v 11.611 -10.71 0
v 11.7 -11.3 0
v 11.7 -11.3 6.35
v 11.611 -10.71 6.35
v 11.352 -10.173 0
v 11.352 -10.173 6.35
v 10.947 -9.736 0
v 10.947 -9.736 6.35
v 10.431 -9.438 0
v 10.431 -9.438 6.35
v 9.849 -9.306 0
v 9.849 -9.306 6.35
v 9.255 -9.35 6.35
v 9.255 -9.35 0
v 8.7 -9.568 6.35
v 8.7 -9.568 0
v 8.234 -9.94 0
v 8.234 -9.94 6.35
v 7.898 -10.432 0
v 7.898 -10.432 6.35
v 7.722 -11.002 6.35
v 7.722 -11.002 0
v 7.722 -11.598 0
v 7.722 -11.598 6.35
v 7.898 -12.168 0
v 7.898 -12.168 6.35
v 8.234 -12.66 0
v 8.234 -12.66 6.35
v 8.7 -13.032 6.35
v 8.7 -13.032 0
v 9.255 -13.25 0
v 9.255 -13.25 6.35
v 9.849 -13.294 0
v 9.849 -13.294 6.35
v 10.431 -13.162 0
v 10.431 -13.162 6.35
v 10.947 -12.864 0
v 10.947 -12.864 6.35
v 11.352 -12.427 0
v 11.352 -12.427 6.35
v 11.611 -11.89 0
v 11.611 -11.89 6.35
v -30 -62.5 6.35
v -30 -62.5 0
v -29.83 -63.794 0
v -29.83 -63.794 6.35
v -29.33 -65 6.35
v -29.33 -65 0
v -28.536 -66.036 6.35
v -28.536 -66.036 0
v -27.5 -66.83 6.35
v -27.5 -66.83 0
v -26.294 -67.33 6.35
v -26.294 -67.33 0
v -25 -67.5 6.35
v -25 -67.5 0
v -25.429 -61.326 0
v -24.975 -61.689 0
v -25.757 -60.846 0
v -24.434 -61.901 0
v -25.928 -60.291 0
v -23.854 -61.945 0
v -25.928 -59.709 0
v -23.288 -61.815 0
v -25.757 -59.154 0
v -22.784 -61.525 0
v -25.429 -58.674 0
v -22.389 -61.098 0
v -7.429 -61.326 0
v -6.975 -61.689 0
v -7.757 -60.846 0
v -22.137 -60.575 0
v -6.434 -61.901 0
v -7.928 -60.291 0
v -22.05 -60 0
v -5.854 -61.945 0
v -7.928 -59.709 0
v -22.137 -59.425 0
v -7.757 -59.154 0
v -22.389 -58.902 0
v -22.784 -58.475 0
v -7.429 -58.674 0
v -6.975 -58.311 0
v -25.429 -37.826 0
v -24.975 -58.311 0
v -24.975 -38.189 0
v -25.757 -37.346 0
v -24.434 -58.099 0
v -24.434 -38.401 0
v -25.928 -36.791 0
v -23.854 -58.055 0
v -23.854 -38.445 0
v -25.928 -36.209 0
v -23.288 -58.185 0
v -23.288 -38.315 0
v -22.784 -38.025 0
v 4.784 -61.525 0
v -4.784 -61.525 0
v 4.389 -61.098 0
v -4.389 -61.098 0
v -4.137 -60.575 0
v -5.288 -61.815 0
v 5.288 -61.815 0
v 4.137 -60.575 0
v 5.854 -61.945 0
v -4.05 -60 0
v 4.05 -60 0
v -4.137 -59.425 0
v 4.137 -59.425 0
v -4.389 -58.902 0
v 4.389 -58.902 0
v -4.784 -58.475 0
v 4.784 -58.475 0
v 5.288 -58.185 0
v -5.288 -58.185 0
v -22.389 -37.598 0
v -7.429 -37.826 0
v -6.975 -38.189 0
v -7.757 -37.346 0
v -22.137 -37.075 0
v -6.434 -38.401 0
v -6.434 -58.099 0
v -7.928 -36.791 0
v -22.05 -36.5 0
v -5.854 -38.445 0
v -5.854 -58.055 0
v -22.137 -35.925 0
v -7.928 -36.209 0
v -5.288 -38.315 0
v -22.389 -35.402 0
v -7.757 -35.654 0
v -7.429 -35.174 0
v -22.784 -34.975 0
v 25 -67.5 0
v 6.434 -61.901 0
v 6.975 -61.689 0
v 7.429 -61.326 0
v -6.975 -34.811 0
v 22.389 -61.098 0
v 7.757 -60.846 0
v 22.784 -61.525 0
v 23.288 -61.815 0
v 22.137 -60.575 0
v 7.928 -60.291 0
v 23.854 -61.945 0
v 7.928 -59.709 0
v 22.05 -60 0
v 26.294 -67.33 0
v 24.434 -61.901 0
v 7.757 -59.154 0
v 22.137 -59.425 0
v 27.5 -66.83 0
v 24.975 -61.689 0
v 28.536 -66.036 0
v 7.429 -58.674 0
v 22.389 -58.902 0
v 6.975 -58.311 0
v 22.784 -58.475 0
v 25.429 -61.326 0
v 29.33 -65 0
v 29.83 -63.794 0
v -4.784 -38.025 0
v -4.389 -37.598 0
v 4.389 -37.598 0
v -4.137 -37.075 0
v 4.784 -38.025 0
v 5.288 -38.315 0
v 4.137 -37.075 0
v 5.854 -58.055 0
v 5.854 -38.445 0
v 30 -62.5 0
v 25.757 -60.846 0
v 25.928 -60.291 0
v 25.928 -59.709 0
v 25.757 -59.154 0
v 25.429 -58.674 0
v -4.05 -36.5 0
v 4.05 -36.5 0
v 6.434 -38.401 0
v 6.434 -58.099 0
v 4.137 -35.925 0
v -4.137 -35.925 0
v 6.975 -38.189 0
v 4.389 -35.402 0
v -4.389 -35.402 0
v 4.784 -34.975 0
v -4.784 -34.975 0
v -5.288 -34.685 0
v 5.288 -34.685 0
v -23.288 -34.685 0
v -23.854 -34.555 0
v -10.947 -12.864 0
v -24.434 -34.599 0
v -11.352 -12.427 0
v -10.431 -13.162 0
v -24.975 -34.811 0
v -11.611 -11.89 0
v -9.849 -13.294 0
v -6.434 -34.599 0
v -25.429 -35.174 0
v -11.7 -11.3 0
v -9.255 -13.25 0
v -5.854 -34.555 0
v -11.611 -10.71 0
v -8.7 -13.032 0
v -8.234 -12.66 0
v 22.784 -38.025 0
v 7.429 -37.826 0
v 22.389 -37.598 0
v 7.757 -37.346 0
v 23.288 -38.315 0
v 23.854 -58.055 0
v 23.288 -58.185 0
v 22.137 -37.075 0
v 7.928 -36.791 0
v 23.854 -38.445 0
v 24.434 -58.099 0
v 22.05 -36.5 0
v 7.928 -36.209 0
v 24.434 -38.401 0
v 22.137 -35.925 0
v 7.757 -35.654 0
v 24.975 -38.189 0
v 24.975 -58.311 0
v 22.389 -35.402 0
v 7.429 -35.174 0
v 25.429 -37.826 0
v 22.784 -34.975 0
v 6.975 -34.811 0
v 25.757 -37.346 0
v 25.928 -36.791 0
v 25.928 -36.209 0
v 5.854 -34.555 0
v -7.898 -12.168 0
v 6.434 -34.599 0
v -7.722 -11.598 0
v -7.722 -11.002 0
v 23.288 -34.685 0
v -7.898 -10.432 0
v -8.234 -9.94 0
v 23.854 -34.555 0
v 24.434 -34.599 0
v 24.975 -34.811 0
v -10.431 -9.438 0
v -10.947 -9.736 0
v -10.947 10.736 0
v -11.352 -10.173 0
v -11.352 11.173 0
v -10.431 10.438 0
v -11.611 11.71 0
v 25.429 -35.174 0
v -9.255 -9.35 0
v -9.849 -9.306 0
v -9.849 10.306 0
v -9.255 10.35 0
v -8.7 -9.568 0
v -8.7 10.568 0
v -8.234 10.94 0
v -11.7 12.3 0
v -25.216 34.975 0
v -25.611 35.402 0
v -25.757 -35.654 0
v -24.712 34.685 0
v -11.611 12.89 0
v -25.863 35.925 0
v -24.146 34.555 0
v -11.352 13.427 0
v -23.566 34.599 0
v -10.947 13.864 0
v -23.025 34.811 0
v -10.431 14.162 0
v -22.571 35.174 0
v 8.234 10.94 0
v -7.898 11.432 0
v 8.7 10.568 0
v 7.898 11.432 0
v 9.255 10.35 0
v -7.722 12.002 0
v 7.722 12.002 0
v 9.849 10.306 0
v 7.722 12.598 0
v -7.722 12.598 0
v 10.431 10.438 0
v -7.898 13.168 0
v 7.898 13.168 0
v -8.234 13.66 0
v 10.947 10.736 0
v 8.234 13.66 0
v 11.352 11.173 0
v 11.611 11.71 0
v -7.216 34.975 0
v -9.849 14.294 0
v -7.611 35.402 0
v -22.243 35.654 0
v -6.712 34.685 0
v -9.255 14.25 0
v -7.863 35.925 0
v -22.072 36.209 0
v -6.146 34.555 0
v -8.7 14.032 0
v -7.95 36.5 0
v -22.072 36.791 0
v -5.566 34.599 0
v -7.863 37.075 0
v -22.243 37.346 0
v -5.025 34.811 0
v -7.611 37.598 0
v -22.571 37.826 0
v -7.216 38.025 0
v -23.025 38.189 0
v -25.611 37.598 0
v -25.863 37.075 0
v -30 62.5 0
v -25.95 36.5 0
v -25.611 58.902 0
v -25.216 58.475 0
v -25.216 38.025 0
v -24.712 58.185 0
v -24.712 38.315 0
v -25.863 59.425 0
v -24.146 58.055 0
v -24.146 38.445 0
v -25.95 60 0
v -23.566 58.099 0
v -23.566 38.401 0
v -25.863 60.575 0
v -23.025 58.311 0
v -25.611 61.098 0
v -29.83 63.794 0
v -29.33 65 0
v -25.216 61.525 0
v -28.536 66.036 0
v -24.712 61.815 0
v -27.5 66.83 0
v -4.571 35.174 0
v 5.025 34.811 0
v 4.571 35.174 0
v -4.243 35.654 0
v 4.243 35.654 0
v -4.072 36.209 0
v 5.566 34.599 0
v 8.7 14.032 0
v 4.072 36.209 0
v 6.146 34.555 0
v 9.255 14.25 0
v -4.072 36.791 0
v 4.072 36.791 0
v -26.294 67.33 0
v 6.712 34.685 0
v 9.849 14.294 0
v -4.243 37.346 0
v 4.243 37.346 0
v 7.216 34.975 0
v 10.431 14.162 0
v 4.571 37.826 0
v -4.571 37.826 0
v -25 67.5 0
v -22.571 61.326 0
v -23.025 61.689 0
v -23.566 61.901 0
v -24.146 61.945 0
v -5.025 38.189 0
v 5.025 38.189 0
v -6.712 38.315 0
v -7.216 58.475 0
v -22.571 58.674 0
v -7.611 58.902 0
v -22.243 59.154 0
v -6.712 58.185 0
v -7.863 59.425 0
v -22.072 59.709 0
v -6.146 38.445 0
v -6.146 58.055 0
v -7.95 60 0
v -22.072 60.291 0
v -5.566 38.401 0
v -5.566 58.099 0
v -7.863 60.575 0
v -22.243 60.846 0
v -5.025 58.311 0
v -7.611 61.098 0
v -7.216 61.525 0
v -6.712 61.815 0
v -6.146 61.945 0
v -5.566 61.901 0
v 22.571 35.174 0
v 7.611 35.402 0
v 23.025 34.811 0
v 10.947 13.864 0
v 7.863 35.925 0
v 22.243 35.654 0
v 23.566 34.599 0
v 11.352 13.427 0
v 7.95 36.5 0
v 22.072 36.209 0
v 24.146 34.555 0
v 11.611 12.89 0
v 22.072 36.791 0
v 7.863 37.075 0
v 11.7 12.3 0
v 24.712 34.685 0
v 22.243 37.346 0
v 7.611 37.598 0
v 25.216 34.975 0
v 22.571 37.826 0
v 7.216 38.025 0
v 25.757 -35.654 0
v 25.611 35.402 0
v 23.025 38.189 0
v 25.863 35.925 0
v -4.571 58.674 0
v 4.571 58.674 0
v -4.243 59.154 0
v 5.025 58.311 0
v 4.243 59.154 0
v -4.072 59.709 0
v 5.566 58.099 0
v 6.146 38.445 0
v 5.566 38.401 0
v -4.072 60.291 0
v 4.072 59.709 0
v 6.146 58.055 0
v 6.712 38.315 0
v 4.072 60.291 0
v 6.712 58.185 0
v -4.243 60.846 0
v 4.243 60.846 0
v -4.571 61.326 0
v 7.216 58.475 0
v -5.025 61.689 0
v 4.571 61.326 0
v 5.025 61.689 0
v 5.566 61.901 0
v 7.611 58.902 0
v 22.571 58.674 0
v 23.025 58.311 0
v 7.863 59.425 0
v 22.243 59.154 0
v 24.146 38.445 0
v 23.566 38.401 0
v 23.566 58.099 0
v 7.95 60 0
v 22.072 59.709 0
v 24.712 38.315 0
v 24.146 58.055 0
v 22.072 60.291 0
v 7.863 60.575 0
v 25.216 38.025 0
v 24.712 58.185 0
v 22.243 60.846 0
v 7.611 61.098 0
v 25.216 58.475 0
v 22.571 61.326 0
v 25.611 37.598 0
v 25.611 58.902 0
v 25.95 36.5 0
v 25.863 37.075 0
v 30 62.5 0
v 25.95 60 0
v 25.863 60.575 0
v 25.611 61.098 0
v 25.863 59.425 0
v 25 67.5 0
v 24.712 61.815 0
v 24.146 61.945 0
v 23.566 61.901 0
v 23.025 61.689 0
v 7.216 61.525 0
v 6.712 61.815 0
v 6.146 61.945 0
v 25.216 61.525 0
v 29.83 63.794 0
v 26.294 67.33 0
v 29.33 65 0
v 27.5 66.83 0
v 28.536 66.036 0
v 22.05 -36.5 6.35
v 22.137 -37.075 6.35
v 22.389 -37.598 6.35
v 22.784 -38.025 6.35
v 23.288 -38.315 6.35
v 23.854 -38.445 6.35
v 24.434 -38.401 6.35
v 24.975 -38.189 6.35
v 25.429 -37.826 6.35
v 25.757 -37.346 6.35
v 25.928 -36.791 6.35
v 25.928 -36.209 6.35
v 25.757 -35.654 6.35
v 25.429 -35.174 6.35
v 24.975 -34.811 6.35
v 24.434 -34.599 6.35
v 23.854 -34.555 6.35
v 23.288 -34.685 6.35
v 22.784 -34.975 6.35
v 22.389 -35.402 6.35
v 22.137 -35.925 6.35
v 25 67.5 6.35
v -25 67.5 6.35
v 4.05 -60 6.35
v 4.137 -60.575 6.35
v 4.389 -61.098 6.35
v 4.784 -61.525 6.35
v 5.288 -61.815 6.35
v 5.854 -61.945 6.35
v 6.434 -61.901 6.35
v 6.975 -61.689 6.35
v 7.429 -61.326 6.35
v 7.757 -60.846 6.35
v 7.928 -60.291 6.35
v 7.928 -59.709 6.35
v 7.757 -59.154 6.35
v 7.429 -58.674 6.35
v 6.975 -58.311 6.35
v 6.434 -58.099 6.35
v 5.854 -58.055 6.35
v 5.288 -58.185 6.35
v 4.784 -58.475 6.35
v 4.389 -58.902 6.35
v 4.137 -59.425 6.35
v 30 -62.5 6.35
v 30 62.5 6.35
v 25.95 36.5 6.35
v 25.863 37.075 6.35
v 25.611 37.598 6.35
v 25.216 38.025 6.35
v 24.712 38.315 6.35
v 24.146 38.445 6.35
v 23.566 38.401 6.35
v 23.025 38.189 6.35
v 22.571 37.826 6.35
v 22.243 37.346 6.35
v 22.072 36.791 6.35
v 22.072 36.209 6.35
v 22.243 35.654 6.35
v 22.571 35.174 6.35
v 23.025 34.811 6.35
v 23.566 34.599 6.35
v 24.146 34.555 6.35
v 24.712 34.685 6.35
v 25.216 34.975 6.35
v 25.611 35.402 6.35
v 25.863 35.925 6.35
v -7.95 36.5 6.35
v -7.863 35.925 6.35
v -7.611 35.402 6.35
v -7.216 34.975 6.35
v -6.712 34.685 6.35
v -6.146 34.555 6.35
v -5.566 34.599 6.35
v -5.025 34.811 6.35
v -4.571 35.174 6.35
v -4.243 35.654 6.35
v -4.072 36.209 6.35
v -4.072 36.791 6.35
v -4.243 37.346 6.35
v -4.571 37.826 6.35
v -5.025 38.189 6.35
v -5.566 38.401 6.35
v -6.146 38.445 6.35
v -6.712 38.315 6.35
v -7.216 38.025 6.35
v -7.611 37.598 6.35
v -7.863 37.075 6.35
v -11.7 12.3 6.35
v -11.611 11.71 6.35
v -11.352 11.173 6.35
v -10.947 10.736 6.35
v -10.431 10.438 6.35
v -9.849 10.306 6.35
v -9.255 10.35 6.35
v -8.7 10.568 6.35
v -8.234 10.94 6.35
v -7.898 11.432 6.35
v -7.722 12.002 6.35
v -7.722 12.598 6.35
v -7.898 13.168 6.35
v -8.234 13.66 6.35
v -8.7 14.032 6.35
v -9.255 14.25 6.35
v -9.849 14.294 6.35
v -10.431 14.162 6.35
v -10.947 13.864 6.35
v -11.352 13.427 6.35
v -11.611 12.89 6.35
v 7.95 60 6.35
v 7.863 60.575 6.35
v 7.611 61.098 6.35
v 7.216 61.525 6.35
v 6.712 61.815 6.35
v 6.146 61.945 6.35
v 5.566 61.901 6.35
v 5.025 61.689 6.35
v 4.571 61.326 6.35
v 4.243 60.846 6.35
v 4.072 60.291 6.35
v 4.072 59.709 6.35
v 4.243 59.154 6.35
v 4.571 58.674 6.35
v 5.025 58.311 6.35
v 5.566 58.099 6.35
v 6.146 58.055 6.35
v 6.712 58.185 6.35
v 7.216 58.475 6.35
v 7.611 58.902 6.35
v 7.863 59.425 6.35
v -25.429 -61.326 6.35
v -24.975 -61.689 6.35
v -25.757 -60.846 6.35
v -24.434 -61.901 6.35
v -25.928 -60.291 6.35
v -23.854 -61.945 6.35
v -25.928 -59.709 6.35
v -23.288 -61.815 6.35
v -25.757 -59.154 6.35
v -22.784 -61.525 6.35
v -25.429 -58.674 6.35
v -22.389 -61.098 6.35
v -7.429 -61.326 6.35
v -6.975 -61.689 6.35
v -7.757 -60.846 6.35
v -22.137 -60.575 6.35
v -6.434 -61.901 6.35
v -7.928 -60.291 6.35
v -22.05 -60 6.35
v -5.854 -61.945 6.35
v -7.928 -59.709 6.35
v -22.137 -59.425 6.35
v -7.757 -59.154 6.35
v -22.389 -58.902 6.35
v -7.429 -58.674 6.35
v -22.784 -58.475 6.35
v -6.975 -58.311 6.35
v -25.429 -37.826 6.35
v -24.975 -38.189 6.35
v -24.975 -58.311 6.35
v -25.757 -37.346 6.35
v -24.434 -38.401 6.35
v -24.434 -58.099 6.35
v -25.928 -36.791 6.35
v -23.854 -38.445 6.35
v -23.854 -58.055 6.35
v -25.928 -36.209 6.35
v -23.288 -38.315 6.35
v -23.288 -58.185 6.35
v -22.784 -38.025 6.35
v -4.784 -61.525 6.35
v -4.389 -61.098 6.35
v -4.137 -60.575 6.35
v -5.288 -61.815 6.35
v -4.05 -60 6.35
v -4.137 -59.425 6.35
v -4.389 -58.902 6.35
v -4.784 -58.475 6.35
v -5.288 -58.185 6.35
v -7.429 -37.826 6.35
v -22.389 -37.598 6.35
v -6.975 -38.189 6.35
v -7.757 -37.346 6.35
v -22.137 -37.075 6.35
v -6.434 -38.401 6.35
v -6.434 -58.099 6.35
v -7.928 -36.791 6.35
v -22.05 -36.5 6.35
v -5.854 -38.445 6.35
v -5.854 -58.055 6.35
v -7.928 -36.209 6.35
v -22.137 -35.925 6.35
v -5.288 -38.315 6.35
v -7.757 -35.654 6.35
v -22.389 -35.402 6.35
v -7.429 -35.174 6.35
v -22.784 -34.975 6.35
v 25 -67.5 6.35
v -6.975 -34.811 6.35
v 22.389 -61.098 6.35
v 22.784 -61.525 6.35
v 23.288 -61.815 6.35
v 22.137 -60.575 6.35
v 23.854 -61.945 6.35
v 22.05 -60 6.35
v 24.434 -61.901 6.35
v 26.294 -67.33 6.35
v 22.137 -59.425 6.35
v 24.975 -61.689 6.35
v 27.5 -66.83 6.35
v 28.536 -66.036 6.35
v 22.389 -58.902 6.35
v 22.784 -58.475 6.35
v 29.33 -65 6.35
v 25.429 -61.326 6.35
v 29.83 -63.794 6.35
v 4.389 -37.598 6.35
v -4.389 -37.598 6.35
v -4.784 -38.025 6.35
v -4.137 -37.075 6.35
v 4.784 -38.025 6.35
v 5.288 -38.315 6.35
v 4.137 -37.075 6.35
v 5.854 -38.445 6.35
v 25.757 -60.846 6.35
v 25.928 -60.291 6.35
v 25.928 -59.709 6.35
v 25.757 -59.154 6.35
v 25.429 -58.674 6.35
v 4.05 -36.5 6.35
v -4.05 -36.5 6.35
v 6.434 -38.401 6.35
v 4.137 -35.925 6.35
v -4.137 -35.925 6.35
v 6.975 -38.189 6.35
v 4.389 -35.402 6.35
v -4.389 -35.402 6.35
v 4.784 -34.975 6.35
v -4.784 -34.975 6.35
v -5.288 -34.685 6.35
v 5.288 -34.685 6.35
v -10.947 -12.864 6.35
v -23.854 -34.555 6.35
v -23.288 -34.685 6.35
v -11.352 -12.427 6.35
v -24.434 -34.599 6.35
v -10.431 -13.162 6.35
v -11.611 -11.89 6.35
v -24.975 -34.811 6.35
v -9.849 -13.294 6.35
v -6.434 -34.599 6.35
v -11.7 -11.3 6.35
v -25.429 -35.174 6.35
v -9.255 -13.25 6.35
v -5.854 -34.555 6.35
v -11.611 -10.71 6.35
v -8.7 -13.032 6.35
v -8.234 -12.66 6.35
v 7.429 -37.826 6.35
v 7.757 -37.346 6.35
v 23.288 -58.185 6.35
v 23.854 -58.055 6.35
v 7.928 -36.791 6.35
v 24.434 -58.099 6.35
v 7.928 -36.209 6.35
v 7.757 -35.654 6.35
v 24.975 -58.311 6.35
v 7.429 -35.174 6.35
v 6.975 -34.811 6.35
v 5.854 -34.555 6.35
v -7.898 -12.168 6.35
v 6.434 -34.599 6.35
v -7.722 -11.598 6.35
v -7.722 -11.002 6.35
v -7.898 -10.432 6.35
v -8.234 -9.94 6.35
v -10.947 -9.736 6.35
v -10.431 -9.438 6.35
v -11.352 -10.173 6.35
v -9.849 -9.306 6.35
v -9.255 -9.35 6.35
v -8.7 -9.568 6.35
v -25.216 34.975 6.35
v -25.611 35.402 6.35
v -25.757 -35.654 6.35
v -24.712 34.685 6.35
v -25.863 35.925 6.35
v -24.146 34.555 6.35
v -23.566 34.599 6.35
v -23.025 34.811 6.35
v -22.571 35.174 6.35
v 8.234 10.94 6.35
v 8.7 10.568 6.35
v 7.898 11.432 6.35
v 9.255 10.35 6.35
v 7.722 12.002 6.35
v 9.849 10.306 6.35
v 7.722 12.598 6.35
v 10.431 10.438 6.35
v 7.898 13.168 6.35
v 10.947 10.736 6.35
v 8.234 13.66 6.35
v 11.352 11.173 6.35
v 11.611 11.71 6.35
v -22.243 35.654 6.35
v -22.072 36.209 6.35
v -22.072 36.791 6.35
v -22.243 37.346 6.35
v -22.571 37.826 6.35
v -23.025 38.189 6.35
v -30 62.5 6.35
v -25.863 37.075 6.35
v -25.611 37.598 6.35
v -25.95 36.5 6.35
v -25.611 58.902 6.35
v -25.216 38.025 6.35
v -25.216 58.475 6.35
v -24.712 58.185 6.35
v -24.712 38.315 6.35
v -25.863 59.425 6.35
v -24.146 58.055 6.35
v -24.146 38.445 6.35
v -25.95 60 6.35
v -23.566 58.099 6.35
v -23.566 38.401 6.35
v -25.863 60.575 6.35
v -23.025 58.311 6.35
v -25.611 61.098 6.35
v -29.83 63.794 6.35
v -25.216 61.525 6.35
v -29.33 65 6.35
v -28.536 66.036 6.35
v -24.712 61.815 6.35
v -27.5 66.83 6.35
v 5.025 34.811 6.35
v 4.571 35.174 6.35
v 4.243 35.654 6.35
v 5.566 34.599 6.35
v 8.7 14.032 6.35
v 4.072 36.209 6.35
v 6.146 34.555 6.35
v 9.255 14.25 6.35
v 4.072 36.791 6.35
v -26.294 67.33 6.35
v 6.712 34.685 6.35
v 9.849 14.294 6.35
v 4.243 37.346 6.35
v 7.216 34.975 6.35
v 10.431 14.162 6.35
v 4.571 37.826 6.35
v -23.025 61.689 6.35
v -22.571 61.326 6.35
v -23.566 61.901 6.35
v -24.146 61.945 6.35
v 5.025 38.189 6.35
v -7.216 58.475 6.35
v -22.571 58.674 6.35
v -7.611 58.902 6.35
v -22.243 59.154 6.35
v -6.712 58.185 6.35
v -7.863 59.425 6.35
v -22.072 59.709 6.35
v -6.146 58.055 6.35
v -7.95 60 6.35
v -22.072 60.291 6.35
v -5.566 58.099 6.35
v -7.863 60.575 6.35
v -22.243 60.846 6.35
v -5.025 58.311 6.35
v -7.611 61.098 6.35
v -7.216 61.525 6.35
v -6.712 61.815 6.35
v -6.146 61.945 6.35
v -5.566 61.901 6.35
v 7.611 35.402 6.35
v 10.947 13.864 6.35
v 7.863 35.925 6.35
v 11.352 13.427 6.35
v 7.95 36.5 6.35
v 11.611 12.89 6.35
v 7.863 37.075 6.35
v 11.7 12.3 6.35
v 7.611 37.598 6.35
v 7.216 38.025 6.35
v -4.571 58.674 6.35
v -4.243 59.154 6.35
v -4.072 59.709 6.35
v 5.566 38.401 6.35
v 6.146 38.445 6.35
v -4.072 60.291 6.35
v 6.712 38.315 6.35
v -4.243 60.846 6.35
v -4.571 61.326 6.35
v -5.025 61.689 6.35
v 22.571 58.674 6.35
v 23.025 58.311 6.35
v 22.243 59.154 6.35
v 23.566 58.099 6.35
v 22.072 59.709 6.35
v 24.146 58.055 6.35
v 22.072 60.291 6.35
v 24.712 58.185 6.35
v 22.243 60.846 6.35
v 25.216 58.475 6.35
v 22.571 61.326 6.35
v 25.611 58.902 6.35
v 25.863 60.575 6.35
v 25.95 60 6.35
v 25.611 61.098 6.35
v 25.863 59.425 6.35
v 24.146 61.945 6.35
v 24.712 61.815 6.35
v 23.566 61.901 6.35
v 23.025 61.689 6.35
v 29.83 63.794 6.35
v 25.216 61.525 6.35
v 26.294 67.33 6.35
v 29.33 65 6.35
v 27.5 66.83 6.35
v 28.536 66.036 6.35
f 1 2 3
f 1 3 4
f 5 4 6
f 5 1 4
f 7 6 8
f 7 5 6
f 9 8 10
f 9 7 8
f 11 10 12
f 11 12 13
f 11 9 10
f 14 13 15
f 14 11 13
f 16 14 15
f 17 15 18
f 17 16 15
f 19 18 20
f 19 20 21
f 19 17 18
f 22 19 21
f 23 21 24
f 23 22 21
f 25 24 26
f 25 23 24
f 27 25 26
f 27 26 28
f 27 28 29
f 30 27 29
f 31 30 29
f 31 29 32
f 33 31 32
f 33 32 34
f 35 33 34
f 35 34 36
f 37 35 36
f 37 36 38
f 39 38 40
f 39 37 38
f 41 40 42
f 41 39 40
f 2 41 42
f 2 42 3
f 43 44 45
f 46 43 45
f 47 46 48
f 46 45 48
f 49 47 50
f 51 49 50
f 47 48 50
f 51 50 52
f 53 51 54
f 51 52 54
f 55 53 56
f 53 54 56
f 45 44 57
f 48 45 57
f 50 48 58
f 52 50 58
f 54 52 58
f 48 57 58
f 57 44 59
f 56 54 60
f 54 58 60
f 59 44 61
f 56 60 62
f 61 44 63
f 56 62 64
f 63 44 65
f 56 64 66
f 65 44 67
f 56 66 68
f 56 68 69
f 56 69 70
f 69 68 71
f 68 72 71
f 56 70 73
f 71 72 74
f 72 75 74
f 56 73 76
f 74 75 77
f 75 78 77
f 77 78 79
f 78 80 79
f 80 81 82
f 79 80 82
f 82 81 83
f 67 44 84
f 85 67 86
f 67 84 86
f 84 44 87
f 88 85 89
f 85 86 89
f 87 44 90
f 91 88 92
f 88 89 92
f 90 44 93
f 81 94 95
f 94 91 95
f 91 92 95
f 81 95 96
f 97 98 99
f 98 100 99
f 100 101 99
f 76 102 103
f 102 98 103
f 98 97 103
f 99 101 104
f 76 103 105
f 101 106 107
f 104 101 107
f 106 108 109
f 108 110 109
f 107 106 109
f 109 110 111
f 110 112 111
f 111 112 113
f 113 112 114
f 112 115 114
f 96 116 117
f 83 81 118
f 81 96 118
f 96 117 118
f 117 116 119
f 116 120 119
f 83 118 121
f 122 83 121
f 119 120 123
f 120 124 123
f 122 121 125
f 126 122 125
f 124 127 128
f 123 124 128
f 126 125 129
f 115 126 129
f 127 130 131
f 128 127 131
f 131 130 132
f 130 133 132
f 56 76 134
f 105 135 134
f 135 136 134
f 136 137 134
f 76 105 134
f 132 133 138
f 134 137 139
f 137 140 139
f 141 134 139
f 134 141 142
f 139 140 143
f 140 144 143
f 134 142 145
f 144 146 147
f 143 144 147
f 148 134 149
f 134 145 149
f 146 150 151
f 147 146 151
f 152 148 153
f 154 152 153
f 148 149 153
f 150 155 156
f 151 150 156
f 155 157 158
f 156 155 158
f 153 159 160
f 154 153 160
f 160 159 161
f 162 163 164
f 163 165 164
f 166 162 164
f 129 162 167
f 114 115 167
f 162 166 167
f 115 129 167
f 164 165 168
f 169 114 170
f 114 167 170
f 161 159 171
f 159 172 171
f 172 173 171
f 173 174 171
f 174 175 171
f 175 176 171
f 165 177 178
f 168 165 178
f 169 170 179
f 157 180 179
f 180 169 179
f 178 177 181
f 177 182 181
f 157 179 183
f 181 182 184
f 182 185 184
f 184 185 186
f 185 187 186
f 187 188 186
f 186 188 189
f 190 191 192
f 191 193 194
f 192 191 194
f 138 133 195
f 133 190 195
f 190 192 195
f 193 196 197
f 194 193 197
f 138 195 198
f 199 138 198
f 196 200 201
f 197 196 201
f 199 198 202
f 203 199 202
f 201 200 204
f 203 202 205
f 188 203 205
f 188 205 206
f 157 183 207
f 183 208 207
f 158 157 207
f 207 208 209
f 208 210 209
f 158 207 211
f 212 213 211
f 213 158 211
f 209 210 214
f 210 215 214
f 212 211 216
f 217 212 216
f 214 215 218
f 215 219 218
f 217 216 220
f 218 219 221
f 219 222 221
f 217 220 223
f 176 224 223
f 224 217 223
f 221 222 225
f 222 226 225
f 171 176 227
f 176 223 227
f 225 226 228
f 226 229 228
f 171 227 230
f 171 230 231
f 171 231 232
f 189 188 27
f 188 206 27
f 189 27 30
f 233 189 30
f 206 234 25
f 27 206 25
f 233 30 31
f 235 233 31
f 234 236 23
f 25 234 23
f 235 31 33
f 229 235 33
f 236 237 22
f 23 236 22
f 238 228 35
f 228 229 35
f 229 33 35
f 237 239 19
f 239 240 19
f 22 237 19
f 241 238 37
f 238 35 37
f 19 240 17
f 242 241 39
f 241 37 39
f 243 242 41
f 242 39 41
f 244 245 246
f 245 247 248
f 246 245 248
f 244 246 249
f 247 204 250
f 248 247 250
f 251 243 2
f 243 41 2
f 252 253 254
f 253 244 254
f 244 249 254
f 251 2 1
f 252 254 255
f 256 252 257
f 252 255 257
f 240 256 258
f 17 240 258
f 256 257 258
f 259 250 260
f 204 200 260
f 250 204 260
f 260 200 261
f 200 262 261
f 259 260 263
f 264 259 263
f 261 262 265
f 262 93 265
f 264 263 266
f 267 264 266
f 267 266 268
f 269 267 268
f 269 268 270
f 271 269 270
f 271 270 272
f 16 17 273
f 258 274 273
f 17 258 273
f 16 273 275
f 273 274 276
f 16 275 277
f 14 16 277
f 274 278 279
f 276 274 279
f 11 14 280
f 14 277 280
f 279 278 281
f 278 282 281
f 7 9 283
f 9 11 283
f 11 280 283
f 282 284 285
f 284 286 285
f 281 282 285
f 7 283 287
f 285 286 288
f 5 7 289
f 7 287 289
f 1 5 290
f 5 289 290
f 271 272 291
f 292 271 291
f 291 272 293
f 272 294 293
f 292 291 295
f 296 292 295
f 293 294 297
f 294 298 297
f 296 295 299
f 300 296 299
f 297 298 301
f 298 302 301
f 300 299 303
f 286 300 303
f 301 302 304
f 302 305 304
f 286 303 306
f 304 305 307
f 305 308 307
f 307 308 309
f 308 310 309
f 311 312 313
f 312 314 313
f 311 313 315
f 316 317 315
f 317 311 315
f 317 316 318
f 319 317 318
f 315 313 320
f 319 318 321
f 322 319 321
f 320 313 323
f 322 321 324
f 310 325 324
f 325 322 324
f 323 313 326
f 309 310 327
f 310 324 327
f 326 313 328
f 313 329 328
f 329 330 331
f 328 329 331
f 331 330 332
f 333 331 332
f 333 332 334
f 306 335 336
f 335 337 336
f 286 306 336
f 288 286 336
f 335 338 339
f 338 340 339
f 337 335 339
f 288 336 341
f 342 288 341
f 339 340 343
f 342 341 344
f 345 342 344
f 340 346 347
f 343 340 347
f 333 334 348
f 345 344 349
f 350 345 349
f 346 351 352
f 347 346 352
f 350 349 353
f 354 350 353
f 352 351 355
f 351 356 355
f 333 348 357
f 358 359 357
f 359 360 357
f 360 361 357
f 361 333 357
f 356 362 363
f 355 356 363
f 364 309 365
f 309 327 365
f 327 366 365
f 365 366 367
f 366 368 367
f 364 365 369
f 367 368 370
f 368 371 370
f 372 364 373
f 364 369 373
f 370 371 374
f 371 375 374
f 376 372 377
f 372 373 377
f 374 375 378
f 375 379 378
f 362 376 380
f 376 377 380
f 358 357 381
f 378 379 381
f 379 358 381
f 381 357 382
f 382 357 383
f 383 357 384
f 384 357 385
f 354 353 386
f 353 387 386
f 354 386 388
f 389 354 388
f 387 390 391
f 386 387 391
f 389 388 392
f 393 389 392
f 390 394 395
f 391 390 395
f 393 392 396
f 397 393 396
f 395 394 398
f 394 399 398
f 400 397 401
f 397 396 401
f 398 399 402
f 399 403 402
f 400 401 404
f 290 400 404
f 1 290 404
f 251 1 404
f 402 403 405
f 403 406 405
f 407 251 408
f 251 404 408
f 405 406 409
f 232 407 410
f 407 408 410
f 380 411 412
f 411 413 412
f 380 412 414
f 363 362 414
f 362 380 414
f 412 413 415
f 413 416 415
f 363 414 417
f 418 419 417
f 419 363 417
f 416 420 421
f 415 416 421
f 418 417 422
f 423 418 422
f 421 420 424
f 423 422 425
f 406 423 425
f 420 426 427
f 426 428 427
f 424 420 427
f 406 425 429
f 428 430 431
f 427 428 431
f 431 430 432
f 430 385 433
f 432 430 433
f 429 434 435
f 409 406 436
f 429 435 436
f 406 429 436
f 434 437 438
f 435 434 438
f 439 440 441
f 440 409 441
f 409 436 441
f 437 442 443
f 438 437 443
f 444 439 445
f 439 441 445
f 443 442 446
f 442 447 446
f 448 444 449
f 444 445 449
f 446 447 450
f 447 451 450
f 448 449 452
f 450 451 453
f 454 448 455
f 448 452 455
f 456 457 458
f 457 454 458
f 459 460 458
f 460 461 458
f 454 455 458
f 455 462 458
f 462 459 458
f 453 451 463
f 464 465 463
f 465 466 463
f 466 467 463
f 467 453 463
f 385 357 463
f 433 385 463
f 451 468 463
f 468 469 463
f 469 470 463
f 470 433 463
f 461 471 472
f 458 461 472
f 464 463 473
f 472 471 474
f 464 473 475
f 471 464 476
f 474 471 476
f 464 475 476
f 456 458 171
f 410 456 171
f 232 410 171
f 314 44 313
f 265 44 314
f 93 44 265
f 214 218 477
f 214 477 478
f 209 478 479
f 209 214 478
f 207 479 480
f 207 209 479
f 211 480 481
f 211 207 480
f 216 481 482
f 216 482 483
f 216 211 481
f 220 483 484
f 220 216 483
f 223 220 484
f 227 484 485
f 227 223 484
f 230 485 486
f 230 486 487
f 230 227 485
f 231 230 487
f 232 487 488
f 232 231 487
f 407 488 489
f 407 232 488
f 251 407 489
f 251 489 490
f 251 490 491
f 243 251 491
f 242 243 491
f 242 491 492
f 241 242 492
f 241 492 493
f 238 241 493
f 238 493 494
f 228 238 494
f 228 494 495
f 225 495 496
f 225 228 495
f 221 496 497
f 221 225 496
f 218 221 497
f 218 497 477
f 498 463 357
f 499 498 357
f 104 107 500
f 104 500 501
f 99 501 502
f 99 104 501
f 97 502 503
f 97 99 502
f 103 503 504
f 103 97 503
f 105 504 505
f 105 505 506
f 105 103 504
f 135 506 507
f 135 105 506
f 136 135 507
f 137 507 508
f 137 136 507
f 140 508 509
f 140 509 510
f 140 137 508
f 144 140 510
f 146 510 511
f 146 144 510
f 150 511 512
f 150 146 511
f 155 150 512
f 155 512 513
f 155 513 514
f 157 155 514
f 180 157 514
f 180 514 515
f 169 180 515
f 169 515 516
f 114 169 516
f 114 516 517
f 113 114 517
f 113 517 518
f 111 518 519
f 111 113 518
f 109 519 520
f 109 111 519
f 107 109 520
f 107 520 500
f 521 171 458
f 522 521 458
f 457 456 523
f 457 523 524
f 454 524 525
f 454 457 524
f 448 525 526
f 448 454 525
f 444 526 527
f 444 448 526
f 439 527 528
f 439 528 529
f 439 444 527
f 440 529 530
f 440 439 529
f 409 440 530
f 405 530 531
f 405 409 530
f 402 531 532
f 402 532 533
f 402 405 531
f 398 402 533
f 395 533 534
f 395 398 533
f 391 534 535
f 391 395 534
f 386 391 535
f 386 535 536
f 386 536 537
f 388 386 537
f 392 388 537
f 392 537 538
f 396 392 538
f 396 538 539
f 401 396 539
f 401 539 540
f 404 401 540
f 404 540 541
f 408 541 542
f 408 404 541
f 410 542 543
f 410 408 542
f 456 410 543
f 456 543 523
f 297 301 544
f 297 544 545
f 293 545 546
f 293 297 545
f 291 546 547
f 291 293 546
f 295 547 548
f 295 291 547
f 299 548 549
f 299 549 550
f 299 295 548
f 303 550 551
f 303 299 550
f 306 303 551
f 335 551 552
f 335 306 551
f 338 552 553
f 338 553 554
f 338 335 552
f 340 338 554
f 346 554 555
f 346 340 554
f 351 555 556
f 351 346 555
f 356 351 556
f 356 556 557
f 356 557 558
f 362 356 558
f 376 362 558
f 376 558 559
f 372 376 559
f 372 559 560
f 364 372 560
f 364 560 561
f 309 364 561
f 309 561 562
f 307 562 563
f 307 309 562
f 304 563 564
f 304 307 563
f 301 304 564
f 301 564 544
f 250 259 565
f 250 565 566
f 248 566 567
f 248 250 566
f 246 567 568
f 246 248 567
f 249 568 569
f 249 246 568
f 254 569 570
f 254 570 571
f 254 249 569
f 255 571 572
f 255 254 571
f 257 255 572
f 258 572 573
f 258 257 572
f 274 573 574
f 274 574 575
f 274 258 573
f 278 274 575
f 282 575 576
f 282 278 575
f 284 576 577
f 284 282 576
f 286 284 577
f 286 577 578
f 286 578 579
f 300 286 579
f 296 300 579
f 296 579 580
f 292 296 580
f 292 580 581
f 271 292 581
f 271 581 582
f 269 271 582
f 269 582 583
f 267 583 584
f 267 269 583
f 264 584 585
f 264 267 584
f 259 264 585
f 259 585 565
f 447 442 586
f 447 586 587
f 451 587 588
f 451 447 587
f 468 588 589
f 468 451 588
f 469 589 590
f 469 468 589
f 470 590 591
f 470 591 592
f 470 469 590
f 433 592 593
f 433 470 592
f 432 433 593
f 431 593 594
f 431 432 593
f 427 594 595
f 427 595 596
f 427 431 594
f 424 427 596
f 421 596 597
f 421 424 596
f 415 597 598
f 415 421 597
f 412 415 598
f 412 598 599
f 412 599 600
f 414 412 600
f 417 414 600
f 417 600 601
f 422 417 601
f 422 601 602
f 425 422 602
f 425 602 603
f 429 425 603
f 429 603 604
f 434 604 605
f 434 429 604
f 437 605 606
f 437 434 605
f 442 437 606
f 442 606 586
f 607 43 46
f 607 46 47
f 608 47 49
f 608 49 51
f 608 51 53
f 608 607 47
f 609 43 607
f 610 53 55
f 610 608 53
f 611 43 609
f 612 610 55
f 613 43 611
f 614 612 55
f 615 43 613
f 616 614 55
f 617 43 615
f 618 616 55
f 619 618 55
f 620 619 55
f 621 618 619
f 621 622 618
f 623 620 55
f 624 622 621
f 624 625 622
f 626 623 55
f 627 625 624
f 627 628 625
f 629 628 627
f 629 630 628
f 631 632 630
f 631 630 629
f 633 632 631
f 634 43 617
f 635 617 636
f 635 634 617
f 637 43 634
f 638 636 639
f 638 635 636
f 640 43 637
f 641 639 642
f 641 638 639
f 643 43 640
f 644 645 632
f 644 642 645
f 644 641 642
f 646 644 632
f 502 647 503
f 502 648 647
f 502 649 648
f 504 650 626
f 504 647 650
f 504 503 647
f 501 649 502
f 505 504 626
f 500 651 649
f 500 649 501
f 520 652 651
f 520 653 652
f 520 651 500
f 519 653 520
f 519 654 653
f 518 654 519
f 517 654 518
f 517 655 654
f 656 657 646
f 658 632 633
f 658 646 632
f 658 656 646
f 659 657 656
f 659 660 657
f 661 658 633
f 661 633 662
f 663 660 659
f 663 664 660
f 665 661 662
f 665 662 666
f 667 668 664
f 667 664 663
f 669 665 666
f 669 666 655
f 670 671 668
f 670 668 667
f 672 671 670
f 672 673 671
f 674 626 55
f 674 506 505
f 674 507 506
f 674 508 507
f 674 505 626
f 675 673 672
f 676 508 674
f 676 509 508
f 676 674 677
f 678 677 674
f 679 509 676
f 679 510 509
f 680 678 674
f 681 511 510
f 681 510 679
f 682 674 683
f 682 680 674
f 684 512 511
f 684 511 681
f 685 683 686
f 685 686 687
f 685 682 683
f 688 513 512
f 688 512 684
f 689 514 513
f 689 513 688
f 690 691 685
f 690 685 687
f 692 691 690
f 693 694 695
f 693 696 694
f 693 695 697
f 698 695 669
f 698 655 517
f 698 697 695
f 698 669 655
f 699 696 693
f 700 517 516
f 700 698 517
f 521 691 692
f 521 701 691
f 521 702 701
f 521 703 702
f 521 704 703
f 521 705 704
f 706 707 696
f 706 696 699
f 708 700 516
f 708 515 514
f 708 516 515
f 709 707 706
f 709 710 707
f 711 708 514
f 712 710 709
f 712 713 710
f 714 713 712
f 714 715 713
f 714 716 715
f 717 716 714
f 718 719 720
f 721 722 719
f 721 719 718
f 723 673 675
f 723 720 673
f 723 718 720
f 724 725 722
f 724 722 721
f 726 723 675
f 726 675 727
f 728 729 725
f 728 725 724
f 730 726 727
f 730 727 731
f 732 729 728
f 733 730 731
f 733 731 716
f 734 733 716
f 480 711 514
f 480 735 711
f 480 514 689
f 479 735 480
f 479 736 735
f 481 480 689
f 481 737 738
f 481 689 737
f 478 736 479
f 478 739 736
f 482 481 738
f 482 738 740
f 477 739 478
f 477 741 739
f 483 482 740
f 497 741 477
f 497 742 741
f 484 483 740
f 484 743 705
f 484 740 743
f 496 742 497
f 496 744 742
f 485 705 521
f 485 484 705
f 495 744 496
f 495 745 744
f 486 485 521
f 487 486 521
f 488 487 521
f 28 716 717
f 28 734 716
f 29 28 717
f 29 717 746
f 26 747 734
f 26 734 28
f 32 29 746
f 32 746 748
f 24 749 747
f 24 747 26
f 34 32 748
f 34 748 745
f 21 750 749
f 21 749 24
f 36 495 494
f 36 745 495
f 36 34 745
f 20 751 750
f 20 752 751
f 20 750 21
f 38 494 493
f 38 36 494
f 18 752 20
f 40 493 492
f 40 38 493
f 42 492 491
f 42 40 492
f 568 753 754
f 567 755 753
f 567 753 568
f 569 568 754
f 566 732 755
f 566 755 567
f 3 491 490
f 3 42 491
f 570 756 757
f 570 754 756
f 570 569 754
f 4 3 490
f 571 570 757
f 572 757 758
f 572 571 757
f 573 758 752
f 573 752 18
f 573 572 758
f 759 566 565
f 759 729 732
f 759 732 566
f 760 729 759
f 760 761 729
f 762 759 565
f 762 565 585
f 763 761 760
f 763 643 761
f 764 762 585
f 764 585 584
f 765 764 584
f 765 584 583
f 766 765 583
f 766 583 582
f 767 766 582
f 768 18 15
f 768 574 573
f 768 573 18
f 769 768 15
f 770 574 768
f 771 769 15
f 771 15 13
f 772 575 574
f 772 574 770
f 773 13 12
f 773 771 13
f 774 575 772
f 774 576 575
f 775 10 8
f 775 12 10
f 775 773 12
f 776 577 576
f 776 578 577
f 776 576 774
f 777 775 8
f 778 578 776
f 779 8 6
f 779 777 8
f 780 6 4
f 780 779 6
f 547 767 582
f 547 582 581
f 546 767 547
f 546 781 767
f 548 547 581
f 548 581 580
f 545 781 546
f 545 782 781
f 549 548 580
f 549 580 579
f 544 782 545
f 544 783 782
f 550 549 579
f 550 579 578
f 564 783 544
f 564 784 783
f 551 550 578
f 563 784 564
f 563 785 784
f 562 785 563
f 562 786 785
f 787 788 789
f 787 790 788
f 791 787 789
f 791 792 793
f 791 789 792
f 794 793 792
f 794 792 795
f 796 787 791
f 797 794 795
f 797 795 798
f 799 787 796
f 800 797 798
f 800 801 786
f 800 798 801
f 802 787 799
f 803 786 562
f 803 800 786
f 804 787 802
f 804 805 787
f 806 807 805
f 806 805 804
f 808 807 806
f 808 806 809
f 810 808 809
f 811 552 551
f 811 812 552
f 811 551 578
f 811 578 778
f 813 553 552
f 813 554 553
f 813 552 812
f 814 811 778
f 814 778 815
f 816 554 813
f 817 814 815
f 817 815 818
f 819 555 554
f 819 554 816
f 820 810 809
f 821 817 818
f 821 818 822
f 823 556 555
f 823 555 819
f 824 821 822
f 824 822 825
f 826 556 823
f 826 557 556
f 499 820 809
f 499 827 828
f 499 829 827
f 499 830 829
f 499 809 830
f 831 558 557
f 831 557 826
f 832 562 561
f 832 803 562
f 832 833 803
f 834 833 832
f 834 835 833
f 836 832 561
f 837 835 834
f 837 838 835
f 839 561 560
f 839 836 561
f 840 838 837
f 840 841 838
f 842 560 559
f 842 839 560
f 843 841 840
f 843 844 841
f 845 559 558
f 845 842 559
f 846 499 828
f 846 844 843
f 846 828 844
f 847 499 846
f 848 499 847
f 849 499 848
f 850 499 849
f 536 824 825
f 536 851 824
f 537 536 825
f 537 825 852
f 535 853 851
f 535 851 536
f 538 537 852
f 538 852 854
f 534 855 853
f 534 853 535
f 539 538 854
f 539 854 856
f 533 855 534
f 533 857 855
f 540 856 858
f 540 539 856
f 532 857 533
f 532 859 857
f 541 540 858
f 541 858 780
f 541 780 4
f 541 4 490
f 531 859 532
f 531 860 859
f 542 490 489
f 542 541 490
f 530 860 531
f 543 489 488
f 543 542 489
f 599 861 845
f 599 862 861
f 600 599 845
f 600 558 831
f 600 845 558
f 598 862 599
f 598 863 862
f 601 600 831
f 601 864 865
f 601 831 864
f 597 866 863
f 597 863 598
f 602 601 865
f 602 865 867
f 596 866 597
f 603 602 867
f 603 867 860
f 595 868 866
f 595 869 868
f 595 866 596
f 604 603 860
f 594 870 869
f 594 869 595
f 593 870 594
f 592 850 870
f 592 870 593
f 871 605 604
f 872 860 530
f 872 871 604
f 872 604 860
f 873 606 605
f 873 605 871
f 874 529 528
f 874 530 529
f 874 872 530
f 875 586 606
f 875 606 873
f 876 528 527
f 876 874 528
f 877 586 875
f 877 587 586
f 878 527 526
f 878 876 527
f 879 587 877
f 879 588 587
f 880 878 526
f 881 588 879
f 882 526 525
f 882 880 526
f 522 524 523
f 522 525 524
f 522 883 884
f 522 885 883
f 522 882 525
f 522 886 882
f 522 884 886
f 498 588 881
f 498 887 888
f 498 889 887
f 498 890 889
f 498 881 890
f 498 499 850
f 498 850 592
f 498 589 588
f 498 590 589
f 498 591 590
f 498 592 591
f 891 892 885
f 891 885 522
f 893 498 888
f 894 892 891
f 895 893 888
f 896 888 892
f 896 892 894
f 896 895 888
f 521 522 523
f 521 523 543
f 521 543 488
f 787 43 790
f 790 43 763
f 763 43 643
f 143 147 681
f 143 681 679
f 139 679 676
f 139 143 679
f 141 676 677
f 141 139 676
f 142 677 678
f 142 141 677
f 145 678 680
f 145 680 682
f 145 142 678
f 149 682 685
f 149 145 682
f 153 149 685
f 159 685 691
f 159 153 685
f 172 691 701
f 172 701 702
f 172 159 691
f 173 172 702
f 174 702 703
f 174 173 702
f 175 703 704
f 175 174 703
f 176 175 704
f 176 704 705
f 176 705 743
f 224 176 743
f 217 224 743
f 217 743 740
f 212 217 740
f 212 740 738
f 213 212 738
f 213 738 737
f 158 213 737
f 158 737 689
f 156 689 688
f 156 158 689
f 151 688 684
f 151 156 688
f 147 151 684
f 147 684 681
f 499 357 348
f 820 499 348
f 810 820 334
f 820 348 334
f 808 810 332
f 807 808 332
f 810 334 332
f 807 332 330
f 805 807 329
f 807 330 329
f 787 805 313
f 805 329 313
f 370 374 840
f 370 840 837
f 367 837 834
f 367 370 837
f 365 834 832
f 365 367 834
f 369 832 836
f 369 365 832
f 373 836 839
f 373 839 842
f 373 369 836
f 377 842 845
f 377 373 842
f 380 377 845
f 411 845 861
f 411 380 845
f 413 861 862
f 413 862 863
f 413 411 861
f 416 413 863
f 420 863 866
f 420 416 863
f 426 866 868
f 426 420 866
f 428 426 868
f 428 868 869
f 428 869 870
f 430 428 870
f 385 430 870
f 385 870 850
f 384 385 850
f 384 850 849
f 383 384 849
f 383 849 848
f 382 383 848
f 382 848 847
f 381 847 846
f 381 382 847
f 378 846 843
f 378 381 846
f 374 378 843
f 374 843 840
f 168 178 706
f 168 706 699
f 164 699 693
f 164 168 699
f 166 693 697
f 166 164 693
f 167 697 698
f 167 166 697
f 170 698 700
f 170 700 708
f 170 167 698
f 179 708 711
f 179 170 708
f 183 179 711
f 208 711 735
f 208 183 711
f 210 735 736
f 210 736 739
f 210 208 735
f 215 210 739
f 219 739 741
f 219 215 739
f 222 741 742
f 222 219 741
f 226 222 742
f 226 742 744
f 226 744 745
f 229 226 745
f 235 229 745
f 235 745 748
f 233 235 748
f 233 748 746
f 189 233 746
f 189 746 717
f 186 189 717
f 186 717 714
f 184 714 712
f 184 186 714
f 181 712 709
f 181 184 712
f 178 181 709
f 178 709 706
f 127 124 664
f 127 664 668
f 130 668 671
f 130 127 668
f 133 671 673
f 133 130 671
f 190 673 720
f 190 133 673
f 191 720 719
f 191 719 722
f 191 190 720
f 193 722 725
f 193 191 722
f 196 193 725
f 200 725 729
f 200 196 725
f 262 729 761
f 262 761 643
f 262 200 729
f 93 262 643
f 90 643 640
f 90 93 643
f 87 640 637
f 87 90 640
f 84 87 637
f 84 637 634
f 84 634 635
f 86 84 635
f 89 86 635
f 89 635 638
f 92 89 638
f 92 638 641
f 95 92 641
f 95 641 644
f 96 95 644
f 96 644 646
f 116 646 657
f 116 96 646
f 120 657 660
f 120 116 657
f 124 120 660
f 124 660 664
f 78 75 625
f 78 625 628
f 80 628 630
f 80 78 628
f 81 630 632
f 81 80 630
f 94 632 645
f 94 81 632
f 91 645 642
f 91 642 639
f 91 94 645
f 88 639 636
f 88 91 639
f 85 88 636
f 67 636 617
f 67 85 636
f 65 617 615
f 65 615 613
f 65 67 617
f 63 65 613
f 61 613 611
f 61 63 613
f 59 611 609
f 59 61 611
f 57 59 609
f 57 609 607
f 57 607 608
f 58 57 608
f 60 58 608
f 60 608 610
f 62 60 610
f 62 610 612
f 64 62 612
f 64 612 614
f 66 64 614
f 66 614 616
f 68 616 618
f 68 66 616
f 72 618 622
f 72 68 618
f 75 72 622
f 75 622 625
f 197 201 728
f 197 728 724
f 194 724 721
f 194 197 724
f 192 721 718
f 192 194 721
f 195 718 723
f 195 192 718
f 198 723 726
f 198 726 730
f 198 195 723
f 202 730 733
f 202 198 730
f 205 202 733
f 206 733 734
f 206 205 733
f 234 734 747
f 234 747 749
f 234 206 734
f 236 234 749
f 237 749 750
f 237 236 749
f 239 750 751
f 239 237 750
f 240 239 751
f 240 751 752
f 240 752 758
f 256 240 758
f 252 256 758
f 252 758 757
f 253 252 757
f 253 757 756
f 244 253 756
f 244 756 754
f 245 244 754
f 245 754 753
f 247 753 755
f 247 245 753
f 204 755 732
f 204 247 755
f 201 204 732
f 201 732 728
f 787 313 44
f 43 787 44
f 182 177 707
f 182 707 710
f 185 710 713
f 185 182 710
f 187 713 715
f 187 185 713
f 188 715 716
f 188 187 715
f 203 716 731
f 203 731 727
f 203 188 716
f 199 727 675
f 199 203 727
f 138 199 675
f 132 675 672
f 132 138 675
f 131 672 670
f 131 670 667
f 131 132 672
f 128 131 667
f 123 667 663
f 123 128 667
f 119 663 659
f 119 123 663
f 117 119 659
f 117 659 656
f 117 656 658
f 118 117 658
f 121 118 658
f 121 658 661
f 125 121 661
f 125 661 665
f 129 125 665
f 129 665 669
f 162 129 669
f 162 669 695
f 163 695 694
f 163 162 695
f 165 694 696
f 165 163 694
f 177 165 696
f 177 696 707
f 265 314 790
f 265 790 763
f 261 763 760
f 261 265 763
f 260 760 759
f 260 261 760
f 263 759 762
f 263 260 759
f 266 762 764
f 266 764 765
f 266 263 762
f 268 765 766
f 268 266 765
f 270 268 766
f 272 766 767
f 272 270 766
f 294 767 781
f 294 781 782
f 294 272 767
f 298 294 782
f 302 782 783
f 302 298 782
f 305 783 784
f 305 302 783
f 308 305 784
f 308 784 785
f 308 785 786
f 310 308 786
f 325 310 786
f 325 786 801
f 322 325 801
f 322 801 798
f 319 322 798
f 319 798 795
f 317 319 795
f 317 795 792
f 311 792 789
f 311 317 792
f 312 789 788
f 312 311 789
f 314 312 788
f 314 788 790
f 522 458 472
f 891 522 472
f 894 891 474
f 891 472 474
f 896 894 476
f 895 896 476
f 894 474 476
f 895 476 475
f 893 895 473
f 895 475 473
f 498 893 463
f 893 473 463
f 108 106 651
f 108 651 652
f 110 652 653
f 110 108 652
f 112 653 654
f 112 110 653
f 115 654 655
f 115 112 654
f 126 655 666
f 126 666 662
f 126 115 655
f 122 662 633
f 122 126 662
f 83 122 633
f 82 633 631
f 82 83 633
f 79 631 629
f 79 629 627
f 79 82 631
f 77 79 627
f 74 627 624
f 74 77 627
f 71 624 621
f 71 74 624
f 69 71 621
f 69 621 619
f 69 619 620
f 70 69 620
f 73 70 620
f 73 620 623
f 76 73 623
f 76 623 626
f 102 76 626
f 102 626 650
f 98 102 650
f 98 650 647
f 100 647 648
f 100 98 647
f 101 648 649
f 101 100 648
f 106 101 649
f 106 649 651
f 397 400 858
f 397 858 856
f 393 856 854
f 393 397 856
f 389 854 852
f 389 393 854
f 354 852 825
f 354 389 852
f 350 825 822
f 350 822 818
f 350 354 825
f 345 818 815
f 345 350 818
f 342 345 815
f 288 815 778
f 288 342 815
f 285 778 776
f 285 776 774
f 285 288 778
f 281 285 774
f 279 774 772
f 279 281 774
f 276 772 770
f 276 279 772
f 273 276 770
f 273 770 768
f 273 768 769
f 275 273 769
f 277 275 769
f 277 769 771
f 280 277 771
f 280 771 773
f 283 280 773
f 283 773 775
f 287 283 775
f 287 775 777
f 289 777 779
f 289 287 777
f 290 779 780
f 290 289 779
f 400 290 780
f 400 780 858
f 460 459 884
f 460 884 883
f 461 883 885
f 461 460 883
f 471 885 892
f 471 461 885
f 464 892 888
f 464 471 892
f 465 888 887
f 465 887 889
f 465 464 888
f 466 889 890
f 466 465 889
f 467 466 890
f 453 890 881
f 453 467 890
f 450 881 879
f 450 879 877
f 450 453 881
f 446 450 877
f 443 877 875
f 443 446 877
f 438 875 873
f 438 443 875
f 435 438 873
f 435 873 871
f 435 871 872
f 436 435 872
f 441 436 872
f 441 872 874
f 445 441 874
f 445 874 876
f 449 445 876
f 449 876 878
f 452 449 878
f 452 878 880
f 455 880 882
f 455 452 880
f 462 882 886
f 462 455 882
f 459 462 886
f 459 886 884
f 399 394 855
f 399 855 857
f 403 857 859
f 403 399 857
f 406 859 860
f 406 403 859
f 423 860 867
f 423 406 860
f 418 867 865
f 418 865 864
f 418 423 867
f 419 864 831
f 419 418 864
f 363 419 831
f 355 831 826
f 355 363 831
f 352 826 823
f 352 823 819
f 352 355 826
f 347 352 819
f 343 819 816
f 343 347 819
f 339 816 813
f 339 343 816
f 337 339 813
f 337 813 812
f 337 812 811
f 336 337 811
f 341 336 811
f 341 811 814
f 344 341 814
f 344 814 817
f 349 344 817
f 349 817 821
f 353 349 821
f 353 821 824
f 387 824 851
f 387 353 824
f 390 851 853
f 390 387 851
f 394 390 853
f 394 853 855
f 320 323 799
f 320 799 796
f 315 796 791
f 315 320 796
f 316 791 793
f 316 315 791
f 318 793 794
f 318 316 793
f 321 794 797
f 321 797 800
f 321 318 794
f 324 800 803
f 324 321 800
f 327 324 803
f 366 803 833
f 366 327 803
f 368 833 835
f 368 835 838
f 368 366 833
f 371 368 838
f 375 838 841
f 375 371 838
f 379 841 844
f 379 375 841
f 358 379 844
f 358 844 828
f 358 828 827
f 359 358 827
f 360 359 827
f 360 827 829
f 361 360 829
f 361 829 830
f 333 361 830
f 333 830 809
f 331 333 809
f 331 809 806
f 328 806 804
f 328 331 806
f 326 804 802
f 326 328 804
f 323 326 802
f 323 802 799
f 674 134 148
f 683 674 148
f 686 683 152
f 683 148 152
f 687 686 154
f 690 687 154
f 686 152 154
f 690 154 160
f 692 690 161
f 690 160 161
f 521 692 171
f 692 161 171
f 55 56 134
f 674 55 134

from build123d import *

# Parameters (mm, degrees)
SKETCH1_R           = 1.95
SKETCH1_R_2         = 2
BOSS_EXTRUDE1_DEPTH = 6.35


with BuildPart() as part:
    # Sketch1 → Boss-Extrude1 (new body)
    with BuildSketch(Plane.XY):
        with BuildLine():
            Line((-25, -67.5), (25, -67.5))
            ThreePointArc((25, -67.5), (28.535533906, -66.035533906), (30, -62.5))
            Line((30, -62.5), (30, 62.5))
            ThreePointArc((30, 62.5), (28.535533906, 66.035533906), (25, 67.5))
            Line((25, 67.5), (-25, 67.5))
            ThreePointArc((-25, 67.5), (-28.535533906, 66.035533906), (-30, 62.5))
            Line((-30, 62.5), (-30, -62.5))
            ThreePointArc((-30, -62.5), (-28.535533906, -66.035533906), (-25, -67.5))
        make_face()
        with Locations((24, 60)):
            Circle(SKETCH1_R, mode=Mode.SUBTRACT)
        with Locations((6, 60)):
            Circle(SKETCH1_R, mode=Mode.SUBTRACT)
        with Locations((6, 36.5)):
            Circle(SKETCH1_R, mode=Mode.SUBTRACT)
        with Locations((24, 36.5)):
            Circle(SKETCH1_R, mode=Mode.SUBTRACT)
        with Locations(Location((-6, 60, 0), (0, 0, 180))):
            Circle(SKETCH1_R, mode=Mode.SUBTRACT)
        with Locations(Location((-24, 60, 0), (0, 0, 180))):
            Circle(SKETCH1_R, mode=Mode.SUBTRACT)
        with Locations(Location((-24, 36.5, 0), (0, 0, 180))):
            Circle(SKETCH1_R, mode=Mode.SUBTRACT)
        with Locations(Location((-6, 36.5, 0), (0, 0, 180))):
            Circle(SKETCH1_R, mode=Mode.SUBTRACT)
        with Locations((-24, -36.5)):
            Circle(SKETCH1_R, mode=Mode.SUBTRACT)
        with Locations((-6, -36.5)):
            Circle(SKETCH1_R, mode=Mode.SUBTRACT)
        with Locations(Location((6, -36.5, 0), (0, 0, 180))):
            Circle(SKETCH1_R, mode=Mode.SUBTRACT)
        with Locations(Location((24, -36.5, 0), (0, 0, 180))):
            Circle(SKETCH1_R, mode=Mode.SUBTRACT)
        with Locations(Location((24, -60, 0), (0, 0, 180))):
            Circle(SKETCH1_R, mode=Mode.SUBTRACT)
        with Locations(Location((6, -60, 0), (0, 0, 180))):
            Circle(SKETCH1_R, mode=Mode.SUBTRACT)
        with Locations((-6, -60)):
            Circle(SKETCH1_R, mode=Mode.SUBTRACT)
        with Locations((-24, -60)):
            Circle(SKETCH1_R, mode=Mode.SUBTRACT)
        with Locations((9.7, -11.3)):
            Circle(SKETCH1_R_2, mode=Mode.SUBTRACT)
        with Locations((9.7, 12.3)):
            Circle(SKETCH1_R_2, mode=Mode.SUBTRACT)
        with Locations(Location((-9.7, -11.3, 0), (0, 0, 180))):
            Circle(SKETCH1_R_2, mode=Mode.SUBTRACT)
        with Locations(Location((-9.7, 12.3, 0), (0, 0, 180))):
            Circle(SKETCH1_R_2, mode=Mode.SUBTRACT)
    extrude(amount=BOSS_EXTRUDE1_DEPTH)


solid = part.part
